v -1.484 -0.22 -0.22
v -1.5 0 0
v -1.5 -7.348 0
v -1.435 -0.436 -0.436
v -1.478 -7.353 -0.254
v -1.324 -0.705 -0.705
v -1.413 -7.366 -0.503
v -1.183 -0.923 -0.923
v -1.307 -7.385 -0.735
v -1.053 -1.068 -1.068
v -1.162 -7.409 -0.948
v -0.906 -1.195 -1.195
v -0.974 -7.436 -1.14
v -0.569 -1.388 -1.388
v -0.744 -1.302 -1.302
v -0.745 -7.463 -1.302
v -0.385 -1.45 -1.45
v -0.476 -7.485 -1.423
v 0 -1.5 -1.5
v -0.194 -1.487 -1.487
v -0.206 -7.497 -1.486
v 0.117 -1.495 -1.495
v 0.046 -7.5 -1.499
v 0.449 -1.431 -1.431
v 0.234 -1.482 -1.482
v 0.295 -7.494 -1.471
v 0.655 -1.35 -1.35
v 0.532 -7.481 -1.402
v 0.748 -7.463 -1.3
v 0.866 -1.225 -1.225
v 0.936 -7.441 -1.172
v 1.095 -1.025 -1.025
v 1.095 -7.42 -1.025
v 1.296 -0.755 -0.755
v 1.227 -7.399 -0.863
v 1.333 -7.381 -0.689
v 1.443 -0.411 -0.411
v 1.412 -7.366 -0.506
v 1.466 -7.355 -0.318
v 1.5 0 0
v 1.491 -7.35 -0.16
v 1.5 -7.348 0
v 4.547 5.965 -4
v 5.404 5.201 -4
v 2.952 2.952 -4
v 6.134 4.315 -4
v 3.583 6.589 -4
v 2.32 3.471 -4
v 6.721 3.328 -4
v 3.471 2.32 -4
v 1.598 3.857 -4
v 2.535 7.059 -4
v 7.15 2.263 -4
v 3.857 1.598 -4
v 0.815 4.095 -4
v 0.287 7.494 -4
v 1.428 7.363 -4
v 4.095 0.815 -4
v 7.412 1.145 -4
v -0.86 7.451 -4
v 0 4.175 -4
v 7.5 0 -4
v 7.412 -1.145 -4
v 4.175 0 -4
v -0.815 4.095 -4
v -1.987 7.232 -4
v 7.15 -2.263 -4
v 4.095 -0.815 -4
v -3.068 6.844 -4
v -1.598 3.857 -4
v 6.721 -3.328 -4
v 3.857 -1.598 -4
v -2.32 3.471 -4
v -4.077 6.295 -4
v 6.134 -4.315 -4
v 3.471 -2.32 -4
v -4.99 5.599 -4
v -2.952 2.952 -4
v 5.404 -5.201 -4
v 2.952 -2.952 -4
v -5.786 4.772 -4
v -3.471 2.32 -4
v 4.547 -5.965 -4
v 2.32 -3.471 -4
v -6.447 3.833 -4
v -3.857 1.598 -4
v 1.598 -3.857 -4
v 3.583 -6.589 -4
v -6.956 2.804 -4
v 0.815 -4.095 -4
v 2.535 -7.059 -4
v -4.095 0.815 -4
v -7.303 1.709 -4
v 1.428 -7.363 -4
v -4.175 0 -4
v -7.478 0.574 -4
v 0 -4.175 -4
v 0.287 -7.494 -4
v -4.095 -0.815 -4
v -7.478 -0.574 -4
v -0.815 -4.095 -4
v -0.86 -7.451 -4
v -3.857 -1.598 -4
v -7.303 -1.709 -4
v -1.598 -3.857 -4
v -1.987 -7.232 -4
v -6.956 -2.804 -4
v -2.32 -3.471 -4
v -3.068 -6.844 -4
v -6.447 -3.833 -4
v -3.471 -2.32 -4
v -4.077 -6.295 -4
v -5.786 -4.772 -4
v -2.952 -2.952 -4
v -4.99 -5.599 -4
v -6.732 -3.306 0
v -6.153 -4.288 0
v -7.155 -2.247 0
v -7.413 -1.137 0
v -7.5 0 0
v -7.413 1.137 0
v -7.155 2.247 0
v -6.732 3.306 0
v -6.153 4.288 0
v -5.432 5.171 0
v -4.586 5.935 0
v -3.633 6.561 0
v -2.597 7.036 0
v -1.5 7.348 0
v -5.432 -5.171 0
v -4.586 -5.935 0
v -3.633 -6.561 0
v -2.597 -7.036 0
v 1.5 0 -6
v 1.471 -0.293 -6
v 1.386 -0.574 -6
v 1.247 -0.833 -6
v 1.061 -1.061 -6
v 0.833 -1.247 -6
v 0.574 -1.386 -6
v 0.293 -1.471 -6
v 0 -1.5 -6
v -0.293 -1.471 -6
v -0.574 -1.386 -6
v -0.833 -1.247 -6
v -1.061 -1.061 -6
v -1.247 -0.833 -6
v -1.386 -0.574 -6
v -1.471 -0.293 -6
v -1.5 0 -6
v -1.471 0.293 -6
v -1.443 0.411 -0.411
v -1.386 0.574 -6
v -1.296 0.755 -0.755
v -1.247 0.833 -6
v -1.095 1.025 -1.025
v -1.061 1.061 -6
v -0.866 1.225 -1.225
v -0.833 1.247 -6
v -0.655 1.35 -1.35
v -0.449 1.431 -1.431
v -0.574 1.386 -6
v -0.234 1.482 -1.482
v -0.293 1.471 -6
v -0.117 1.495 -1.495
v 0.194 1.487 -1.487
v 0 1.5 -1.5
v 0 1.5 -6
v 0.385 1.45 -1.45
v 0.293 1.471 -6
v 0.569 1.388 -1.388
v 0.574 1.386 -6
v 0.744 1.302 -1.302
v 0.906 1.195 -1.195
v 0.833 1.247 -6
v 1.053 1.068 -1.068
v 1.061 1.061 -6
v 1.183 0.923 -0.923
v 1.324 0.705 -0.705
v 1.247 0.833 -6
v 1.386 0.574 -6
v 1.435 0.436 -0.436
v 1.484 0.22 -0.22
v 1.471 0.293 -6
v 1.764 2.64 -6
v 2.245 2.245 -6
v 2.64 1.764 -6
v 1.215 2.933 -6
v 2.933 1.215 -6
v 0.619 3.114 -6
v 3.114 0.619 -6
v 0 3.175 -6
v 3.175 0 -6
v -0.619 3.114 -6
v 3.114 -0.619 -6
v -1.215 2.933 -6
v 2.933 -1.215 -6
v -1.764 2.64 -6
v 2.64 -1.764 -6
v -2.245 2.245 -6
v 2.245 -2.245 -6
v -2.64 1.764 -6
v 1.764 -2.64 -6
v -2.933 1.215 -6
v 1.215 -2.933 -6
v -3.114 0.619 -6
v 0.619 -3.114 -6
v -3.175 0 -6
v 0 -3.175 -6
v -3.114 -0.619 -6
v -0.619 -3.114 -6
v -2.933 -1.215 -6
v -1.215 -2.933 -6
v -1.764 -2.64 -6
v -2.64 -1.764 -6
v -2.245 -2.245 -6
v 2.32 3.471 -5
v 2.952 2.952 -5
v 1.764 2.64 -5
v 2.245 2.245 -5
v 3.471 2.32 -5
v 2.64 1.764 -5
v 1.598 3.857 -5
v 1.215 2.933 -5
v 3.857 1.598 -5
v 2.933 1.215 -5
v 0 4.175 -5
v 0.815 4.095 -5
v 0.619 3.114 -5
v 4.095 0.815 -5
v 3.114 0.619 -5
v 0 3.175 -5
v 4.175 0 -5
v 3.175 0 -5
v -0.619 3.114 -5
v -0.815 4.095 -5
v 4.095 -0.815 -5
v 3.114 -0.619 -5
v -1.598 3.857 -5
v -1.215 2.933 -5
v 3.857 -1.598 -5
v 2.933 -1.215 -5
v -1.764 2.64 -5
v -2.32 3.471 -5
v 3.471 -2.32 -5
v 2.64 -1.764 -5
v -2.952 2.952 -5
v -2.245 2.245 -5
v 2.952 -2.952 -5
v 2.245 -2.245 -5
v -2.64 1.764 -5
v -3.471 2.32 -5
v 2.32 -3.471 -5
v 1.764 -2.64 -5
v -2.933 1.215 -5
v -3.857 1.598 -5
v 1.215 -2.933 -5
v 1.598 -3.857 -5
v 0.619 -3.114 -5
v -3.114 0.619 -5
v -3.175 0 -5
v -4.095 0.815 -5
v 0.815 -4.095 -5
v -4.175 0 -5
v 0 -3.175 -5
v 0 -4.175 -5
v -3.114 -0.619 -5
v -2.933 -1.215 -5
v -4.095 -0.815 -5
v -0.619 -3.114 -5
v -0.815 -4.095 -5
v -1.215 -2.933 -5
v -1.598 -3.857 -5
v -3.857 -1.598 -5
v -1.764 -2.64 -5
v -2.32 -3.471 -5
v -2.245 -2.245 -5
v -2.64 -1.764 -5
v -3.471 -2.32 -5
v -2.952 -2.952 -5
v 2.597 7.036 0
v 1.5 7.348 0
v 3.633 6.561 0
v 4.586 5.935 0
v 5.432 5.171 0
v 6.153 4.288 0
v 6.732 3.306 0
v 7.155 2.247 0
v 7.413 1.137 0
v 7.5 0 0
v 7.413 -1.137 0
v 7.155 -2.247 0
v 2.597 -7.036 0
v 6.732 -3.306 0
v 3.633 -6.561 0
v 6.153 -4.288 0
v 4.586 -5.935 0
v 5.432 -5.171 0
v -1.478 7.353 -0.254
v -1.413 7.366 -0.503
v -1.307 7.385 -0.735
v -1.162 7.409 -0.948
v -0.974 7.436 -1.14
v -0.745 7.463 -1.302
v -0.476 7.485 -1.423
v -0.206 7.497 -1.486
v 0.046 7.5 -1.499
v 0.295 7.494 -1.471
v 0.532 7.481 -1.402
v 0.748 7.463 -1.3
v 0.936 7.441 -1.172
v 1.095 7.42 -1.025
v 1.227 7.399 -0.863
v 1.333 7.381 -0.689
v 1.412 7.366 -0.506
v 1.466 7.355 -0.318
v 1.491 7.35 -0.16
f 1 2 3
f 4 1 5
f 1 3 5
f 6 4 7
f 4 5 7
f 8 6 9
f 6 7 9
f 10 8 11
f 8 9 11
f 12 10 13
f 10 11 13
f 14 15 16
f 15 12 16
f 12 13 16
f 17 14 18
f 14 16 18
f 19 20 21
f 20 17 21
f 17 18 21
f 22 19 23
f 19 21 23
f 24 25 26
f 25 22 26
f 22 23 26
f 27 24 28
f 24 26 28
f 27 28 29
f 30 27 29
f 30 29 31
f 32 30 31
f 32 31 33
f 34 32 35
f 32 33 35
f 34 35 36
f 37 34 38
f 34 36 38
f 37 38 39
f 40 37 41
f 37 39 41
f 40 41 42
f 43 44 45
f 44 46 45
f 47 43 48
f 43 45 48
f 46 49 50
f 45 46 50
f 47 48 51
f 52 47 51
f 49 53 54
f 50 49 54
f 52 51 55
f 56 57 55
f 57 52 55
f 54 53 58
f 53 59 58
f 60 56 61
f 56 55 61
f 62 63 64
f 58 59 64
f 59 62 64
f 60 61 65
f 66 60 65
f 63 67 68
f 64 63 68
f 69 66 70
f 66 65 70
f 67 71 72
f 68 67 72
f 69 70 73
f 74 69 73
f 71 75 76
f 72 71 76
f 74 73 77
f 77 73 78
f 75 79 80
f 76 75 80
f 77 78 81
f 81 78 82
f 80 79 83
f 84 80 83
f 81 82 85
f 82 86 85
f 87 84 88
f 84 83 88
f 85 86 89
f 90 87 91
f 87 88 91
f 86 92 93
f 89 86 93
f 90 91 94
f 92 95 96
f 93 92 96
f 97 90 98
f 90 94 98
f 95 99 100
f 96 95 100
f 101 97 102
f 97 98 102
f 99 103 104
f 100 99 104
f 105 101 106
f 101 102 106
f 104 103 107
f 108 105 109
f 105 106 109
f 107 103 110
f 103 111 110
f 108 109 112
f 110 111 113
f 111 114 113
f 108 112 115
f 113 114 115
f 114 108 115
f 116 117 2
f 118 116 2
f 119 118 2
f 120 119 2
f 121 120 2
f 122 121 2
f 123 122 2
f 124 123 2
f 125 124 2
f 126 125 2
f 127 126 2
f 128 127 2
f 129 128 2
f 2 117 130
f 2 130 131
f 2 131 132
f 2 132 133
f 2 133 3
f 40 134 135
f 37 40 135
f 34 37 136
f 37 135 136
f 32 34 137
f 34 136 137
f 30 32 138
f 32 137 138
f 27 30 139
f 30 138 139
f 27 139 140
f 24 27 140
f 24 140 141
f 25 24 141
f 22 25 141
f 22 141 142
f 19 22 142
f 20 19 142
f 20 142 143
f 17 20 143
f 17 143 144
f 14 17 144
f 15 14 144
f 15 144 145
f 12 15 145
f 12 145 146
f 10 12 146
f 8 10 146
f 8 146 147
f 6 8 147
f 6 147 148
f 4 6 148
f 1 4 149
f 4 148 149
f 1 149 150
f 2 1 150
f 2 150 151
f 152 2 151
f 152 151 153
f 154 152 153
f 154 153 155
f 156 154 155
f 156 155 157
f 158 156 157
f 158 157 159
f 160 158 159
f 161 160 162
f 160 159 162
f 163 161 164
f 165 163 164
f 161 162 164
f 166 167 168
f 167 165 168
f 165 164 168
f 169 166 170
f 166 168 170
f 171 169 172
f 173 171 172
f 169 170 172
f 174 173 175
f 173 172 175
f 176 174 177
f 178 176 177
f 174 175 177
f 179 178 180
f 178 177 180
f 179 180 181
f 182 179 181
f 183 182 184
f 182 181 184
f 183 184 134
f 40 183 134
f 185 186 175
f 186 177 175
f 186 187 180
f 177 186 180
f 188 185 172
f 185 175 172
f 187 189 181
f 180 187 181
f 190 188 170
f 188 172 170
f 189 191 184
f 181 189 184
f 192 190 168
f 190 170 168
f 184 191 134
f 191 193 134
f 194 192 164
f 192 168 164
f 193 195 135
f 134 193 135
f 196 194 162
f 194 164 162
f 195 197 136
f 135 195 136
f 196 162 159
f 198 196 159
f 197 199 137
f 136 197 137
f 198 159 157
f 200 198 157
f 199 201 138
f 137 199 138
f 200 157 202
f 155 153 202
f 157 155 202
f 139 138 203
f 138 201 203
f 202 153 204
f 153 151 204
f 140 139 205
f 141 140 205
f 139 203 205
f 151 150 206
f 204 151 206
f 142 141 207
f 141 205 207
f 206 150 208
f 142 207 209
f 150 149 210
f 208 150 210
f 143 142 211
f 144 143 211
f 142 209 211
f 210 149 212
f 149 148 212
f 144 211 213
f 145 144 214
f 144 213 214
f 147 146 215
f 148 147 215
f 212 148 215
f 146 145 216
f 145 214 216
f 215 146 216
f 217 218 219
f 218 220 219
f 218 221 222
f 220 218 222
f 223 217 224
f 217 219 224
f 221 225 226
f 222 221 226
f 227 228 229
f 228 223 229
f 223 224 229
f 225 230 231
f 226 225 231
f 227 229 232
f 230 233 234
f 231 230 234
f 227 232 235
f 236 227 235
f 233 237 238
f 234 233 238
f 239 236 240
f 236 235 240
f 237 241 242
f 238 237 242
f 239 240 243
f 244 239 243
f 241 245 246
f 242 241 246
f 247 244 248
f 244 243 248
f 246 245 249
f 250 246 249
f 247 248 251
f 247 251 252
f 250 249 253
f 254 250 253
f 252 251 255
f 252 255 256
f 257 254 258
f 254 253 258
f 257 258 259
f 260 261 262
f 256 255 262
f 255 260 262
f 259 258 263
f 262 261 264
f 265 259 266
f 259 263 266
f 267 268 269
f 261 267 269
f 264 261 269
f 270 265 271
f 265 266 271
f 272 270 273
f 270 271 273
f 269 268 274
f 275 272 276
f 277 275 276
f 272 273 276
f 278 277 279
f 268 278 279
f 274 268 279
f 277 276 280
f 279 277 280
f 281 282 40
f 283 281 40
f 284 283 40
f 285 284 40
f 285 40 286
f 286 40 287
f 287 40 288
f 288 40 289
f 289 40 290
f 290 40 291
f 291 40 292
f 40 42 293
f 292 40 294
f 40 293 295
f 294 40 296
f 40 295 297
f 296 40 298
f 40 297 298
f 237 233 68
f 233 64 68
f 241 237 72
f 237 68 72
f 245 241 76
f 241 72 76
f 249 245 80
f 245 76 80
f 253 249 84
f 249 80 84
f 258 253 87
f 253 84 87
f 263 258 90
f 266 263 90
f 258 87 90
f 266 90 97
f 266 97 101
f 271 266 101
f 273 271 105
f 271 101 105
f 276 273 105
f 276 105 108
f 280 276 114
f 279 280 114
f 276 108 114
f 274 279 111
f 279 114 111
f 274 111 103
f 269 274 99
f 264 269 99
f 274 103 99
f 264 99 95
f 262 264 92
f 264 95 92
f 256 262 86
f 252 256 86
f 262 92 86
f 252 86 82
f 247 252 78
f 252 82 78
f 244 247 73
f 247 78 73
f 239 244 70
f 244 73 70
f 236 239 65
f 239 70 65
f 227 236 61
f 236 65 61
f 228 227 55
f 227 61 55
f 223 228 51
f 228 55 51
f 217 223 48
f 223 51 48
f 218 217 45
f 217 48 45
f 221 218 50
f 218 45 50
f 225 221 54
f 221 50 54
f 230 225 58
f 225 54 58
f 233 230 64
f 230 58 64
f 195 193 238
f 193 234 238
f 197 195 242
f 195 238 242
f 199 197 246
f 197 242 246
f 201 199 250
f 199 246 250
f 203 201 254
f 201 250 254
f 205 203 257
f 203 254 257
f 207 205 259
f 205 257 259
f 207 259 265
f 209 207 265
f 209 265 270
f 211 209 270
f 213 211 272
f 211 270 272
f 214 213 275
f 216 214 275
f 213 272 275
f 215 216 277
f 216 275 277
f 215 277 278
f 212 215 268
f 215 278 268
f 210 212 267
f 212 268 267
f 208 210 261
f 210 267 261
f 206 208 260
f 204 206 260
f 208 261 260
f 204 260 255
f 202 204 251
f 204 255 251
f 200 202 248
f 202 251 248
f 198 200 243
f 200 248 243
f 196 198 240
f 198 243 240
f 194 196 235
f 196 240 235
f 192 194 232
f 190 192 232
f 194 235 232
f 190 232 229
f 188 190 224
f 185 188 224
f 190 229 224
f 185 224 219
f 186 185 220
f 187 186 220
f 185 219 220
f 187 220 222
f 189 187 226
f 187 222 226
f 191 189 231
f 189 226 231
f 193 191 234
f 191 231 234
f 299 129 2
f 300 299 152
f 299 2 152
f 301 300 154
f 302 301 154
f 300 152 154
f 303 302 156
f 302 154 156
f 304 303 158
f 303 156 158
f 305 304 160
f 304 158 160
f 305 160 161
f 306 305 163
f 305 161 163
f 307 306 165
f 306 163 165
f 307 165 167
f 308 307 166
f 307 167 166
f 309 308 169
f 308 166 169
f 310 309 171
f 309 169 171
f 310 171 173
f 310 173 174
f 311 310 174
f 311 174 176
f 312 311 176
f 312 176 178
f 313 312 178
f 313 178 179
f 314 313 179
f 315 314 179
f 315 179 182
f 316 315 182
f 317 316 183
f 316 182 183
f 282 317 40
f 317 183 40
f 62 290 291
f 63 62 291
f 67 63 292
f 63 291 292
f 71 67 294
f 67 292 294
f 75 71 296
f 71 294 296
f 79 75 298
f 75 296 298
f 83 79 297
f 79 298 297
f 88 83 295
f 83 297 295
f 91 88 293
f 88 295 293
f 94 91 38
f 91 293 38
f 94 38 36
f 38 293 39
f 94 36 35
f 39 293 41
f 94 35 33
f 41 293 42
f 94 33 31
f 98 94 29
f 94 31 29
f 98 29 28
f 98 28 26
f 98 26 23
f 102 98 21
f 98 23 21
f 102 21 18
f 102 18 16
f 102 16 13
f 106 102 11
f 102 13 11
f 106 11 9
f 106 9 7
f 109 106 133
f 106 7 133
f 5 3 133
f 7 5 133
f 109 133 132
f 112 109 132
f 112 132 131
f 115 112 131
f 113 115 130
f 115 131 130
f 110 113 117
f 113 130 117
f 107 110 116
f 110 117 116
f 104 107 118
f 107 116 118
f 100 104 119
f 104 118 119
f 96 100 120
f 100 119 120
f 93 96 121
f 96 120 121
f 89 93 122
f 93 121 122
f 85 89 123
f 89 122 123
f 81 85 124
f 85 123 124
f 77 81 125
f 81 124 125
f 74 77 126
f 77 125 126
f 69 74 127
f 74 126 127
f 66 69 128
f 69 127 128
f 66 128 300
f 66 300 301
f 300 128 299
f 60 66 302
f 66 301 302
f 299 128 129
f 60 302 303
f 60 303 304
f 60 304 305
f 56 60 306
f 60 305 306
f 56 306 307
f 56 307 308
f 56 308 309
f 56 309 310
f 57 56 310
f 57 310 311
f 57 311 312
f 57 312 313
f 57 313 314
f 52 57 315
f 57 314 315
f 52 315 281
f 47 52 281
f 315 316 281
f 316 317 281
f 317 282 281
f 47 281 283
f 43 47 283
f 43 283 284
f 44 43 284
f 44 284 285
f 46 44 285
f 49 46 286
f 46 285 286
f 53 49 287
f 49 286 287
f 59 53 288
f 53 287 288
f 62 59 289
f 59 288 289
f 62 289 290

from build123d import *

# Parameters (mm, degrees)
F3_R     = 1.5
F4_DEPTH = 12.5


with BuildPart() as f2:
    # F0 (on Front) → F2 (revolve)
    with BuildSketch(Plane.XZ):
        Polygon((7.5, 0), (1.5, 0), (1.5, -6), (3.175, -6), (3.175, -5), (4.175, -5), (4.175, -4), (7.5, -4), align=None)
    revolve(axis=Axis((0, 0, -5.151412), (0, 0, -1)))

    # F3 (on Front) → F4 (cut, symmetric)
    with BuildSketch(Plane.XZ):
        Circle(F3_R)
    extrude(amount=F4_DEPTH, both=True, mode=Mode.SUBTRACT)


solid = f2.part
